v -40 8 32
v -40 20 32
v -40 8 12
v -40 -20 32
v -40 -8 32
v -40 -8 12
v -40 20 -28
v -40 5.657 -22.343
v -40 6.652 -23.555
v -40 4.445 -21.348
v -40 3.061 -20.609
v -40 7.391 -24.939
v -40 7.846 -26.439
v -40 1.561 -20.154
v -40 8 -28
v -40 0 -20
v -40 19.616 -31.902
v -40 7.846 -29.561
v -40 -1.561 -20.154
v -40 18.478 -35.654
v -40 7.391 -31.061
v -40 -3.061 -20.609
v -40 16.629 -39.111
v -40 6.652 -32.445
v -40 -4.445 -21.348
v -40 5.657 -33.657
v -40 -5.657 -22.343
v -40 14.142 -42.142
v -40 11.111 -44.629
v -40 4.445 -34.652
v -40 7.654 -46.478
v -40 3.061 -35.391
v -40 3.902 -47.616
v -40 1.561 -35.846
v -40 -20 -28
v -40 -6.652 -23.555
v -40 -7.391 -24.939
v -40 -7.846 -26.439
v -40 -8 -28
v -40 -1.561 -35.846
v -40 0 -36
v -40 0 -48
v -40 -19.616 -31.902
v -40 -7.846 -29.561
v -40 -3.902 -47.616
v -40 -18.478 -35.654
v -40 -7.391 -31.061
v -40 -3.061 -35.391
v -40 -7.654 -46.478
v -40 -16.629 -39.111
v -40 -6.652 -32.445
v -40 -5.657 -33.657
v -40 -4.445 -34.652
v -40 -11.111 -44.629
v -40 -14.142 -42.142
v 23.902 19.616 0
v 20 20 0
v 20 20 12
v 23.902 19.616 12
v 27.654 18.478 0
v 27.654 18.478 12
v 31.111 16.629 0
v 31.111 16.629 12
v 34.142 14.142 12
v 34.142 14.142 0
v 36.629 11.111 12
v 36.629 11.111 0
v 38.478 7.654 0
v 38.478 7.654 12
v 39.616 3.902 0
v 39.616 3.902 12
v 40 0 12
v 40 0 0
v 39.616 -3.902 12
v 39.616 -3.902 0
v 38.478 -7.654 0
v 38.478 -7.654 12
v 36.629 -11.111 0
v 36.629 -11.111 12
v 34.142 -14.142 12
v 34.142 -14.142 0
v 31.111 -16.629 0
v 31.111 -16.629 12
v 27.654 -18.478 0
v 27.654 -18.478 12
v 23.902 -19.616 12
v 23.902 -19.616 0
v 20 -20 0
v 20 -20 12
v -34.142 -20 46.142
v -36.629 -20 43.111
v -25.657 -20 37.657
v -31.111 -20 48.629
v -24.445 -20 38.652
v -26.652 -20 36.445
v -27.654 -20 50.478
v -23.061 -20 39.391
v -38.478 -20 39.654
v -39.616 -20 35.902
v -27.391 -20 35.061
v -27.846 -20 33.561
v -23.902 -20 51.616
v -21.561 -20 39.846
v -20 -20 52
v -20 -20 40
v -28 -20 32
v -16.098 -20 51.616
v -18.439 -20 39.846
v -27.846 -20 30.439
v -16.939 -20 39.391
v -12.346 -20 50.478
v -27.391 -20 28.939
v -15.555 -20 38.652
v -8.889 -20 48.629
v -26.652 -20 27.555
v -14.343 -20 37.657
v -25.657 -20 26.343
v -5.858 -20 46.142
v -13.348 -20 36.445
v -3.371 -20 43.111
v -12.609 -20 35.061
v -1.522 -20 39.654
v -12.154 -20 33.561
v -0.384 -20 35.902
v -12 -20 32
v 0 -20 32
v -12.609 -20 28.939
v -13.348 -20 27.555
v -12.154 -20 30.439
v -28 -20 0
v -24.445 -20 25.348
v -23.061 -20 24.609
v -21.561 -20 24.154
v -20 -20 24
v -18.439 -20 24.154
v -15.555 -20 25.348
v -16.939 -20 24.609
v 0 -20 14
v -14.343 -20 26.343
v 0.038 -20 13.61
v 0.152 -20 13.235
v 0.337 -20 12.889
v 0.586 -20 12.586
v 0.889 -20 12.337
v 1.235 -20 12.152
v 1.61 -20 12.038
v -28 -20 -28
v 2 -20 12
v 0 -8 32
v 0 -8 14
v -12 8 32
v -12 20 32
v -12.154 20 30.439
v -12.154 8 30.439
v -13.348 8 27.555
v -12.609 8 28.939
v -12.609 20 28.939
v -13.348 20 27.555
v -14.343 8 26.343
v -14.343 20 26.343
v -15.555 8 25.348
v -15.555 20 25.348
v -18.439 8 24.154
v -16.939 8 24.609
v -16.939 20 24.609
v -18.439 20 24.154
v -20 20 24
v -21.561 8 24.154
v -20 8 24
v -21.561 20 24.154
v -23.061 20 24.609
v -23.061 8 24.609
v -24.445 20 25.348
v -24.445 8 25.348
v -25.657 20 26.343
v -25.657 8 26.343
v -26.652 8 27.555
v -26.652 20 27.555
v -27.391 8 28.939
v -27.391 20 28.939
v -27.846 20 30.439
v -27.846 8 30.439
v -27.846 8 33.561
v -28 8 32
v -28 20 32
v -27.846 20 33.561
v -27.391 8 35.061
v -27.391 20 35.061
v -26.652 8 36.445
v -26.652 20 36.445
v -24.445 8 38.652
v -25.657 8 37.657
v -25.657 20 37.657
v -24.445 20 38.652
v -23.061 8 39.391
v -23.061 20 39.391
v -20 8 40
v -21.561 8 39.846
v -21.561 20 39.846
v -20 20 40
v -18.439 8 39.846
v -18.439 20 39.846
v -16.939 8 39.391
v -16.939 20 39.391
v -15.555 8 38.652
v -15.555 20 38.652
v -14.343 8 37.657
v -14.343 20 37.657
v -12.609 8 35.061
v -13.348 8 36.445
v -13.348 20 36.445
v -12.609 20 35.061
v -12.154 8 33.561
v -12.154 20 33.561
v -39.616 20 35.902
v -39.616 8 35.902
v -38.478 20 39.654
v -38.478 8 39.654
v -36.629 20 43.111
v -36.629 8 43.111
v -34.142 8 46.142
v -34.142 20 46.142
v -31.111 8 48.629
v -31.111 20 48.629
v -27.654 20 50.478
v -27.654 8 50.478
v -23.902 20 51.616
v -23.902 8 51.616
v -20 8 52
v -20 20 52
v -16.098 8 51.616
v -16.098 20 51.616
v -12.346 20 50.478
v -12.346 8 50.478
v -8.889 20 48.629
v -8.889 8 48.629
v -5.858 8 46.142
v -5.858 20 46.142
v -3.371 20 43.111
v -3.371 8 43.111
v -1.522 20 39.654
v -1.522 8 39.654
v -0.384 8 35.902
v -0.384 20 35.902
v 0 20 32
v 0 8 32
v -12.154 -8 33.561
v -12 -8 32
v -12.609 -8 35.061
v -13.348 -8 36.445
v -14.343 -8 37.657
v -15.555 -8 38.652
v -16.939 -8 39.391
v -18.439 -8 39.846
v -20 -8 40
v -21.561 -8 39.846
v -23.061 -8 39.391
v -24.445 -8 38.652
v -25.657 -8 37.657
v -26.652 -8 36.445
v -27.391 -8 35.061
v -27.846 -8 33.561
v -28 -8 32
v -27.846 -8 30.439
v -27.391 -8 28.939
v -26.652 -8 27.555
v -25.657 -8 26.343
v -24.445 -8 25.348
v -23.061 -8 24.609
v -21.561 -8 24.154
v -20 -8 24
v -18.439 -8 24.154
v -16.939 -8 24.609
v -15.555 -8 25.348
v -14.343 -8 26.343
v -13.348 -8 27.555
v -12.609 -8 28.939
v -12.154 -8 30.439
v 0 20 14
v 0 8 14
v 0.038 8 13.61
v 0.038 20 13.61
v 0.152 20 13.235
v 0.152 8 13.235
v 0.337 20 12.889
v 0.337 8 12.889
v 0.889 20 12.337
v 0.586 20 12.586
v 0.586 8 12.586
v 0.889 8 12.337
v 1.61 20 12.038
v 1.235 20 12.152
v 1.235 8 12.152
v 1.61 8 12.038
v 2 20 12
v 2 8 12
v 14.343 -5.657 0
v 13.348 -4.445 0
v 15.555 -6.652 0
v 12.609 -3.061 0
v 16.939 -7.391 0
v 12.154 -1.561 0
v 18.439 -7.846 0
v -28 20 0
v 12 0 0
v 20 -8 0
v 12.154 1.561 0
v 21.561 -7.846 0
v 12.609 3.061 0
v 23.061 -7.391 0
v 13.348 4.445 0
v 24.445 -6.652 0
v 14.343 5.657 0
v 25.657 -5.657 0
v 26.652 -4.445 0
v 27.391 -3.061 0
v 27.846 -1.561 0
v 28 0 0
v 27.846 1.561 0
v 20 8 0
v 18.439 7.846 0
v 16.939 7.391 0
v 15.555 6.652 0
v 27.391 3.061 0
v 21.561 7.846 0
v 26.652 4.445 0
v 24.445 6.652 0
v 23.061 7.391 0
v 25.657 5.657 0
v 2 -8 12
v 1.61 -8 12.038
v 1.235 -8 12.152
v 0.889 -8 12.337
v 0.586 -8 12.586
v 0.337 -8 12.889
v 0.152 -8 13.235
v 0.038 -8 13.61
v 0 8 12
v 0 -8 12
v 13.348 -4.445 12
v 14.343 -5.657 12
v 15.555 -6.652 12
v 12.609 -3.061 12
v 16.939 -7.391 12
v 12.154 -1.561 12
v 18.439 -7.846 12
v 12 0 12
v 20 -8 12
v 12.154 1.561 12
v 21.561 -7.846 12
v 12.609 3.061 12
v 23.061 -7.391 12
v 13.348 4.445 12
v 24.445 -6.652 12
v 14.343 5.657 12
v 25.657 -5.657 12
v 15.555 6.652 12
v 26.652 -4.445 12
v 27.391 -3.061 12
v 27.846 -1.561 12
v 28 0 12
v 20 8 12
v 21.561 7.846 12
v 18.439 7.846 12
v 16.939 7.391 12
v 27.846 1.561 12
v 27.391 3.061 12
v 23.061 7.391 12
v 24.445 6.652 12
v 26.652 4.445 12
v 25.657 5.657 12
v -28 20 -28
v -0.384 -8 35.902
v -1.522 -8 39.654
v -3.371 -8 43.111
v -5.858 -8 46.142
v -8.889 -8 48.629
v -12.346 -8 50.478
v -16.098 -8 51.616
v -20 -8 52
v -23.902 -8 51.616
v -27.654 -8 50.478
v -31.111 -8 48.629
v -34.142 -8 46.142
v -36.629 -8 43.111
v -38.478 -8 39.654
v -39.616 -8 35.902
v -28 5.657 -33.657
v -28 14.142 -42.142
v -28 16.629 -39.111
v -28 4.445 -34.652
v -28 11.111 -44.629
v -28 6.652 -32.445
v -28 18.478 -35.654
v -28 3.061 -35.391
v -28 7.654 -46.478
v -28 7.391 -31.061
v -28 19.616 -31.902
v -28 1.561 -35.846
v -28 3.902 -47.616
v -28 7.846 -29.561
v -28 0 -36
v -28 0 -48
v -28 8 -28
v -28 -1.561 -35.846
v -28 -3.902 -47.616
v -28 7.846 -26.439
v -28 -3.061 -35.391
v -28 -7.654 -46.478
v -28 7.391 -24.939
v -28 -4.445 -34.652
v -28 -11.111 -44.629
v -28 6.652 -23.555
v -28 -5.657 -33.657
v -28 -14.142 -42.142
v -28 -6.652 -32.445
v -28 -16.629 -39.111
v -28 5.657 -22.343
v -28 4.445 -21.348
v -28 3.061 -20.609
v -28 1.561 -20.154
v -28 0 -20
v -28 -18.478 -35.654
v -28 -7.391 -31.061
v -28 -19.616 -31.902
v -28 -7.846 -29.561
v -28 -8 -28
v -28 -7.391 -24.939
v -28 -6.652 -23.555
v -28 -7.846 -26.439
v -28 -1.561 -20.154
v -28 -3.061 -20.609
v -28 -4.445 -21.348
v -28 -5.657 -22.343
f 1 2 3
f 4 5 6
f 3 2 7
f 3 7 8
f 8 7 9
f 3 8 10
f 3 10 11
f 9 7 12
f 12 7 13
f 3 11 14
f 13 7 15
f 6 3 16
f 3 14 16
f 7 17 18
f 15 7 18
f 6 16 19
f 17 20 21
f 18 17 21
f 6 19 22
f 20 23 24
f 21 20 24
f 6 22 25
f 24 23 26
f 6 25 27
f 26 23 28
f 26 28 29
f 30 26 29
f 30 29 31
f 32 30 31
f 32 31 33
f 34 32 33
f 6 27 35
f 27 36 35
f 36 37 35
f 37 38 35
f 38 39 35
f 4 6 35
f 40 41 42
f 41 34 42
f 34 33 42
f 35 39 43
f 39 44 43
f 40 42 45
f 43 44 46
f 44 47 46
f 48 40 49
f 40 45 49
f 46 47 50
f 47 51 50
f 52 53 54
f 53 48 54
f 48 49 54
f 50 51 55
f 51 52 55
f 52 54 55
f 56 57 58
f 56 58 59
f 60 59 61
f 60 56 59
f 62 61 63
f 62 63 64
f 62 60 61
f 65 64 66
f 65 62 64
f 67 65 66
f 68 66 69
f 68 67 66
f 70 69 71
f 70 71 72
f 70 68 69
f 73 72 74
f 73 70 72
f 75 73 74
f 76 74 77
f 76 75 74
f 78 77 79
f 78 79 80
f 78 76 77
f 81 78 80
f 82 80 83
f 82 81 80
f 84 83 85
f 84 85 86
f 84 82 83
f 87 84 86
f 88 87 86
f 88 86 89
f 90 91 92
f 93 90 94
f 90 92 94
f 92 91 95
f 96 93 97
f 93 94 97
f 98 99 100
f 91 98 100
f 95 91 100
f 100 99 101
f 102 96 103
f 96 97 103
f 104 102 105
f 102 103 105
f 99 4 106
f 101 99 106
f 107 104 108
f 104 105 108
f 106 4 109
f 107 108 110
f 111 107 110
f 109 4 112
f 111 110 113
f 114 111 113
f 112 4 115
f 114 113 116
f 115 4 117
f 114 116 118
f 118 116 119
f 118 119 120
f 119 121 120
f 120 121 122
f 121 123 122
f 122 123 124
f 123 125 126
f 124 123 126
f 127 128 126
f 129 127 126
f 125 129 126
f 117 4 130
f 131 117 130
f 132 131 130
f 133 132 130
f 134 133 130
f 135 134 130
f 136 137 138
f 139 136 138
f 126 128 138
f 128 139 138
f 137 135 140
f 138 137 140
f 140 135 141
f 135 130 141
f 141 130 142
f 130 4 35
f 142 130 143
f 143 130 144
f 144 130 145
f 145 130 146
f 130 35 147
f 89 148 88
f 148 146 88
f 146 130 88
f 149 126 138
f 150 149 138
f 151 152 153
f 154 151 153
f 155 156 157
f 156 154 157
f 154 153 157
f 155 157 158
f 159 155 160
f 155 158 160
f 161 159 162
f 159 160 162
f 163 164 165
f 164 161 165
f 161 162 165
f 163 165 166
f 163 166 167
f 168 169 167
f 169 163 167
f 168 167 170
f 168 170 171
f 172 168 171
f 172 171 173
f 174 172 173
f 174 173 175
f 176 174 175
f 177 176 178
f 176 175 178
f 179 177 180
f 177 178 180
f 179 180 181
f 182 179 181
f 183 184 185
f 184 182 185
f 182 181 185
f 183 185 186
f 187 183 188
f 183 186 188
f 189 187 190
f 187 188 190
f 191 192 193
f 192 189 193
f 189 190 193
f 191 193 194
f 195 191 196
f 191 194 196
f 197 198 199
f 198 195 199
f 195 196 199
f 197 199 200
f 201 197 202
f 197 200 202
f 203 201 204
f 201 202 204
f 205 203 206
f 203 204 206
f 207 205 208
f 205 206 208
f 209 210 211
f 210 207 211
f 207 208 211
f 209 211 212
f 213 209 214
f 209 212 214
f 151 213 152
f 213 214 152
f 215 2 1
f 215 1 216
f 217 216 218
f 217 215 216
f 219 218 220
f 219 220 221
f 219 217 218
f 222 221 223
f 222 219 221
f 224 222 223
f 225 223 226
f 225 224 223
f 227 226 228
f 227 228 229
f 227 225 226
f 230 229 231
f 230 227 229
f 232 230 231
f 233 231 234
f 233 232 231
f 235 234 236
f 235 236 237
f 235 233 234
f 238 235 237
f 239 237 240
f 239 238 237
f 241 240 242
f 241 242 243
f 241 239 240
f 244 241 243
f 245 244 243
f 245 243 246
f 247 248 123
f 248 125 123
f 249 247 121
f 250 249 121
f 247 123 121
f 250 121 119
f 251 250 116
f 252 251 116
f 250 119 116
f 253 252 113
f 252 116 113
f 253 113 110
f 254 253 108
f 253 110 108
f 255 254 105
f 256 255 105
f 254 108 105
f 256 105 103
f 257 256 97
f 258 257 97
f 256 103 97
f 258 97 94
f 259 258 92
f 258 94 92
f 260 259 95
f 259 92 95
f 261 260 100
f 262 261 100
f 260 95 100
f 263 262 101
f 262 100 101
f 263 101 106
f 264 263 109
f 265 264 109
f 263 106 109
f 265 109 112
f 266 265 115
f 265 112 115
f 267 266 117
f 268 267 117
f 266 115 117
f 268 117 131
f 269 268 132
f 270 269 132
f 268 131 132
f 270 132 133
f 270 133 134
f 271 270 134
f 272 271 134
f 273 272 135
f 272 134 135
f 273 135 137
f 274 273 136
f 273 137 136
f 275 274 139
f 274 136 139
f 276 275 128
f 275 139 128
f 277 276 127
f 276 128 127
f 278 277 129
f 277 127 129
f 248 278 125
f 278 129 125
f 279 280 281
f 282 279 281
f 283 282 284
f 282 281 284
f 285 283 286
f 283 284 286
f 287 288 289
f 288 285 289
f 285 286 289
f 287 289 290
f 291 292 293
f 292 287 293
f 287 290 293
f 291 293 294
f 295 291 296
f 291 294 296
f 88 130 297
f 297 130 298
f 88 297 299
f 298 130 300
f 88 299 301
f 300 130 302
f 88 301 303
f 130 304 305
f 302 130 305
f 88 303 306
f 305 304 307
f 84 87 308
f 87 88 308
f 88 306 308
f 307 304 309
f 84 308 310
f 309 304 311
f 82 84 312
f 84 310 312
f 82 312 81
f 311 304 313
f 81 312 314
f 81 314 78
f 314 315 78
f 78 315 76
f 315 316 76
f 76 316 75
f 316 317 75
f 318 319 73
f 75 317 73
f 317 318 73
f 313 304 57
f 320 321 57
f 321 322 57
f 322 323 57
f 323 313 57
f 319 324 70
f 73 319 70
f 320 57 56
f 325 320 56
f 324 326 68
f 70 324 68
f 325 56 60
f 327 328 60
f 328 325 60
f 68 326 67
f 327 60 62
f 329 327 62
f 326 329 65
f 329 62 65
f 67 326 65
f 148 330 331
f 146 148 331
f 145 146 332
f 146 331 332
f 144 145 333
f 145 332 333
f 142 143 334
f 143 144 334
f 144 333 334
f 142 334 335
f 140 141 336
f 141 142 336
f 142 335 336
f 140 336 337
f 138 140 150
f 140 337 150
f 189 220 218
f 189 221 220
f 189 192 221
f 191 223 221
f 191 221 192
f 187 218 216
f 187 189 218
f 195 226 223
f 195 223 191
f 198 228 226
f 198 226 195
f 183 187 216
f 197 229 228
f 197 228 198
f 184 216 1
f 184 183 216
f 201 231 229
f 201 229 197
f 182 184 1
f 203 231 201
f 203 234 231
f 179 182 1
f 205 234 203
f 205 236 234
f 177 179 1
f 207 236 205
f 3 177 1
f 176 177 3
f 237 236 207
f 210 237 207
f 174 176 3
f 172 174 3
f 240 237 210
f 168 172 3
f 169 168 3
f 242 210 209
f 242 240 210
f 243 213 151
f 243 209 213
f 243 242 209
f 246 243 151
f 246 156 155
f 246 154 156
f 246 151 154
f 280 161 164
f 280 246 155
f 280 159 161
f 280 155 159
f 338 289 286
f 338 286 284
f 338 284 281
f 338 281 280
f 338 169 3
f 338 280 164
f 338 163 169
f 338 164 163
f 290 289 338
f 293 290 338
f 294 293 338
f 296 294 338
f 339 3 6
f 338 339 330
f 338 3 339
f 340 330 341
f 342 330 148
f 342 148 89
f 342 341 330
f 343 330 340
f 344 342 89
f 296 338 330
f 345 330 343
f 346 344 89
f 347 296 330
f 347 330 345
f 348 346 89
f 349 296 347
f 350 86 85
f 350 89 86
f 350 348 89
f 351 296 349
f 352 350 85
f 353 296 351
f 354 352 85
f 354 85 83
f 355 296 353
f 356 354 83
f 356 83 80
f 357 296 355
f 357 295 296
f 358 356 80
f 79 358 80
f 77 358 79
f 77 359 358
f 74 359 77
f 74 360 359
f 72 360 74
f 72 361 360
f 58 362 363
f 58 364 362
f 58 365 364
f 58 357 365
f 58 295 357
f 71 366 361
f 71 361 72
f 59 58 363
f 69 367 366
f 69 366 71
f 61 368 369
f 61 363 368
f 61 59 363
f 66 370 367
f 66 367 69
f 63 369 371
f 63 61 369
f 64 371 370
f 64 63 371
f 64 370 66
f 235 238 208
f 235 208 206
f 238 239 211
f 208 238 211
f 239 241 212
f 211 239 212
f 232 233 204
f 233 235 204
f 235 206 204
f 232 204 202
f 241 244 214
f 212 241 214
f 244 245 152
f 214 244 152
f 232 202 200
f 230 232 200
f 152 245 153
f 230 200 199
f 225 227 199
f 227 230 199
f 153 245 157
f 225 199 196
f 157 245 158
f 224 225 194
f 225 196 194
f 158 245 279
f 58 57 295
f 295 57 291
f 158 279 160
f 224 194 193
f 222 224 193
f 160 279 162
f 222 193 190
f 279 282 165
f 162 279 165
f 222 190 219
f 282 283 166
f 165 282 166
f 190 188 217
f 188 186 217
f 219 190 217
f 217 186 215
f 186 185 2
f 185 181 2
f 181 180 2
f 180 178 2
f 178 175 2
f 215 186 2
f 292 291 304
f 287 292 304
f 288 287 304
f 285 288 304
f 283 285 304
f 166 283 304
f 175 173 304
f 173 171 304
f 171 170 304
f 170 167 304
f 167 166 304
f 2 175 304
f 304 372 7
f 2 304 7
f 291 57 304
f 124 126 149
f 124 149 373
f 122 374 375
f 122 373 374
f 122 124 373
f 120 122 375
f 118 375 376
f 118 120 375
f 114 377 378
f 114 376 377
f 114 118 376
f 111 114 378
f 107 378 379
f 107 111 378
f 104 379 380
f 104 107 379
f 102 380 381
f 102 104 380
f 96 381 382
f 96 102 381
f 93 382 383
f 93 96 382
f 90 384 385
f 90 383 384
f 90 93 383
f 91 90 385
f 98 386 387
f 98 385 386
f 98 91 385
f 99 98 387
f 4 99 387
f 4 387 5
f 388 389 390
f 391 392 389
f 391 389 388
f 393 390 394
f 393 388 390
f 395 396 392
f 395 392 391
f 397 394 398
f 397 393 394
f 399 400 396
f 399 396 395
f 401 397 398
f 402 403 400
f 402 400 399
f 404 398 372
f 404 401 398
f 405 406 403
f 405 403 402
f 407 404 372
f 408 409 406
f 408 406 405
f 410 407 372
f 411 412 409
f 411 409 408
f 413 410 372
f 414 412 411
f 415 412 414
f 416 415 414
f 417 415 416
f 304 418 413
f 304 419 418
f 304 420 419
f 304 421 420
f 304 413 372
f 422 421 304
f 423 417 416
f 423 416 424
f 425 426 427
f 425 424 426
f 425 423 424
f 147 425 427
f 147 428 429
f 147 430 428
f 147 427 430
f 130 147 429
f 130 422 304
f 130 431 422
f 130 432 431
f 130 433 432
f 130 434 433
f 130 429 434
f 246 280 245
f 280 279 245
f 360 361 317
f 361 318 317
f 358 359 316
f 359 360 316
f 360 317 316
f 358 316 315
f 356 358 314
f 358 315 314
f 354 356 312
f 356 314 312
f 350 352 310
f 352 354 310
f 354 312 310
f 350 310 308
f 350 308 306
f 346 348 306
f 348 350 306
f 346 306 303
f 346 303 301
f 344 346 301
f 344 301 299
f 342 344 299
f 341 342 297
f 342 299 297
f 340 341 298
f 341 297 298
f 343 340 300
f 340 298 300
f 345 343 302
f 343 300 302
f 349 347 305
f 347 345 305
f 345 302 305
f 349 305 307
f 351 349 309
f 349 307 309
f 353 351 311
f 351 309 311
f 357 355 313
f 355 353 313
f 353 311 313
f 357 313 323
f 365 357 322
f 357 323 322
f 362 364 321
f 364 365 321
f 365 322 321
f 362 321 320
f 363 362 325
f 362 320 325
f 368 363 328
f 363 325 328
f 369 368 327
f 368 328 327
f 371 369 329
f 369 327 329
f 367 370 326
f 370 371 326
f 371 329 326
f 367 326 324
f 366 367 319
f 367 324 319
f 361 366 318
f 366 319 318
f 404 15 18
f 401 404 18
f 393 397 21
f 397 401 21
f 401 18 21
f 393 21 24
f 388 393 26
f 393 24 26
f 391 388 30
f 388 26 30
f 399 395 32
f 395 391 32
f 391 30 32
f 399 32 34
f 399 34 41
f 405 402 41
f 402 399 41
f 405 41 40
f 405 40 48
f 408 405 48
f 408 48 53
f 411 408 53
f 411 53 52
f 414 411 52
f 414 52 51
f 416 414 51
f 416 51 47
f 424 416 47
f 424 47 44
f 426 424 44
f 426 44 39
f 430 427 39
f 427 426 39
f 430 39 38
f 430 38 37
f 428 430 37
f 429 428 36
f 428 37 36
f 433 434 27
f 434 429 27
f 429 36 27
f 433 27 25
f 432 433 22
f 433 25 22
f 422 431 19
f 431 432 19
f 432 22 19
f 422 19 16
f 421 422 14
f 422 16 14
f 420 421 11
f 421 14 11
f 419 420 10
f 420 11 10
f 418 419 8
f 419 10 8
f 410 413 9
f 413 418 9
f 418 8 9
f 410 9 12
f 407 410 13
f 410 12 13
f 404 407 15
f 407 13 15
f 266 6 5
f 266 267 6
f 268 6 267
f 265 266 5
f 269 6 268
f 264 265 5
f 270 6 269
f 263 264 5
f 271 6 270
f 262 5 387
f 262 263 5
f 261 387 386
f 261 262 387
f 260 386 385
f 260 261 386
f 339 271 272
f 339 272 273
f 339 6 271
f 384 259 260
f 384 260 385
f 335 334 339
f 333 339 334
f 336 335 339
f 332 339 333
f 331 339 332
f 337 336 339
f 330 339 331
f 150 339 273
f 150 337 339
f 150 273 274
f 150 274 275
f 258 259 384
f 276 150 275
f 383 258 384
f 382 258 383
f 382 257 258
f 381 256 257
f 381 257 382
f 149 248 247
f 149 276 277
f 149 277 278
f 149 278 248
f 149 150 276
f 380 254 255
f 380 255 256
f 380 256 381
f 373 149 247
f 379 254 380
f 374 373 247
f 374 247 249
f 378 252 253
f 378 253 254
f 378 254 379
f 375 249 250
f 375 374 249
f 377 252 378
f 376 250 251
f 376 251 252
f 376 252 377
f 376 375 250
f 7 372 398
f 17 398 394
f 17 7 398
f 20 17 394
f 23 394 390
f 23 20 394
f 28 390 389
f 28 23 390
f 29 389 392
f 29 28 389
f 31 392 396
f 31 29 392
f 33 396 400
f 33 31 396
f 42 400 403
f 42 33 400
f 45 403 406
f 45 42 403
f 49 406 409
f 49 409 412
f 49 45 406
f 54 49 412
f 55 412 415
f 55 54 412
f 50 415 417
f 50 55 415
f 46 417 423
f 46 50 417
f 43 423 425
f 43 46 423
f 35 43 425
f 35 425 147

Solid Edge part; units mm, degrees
sketch "Sketch1" plane through (0, 0, 0) normal (0, 0, 1) x (1, 0, 0)
  line L0 (-40, -20) -> (20, -20)
  line L1 (-40, 20) -> (-40, -20)
  line L2 (8, 20) -> (-40, 20)
  line L3 (20, 20) -> (8, 20)
  arc A0 (20, 20) -> (20, -20) centre (20, 0) cw
  circle A1 centre (20, 0) radius 8
extrude "ExtrudedProtrusion_1" add sketch "Sketch1" along normal blind 12
sketch "Sketch2" plane through (0, -20, 0) normal (0, -1, 0) x (1, 0, 0)
  line L0 (0, 32) -> (0, 12)
  line L1 (0, 12) -> (-40, 12)
  line L2 (-40, 12) -> (-40, 32)
  arc A0 (-40, 32) -> (0, 32) centre (-20, 32) cw
  circle A1 centre (-20, 32) radius 8
extrude "ExtrudedProtrusion_2" add sketch "Sketch2" against normal blind 12
mirror "Mirror1" about plane through (0, 0, 0) normal (0, -1, 0) of "ExtrudedProtrusion_2"
sketch "Sketch3" plane through (-40, 0, 0) normal (1, 0, 0) x (0, 1, 0)
  line L0 (-20, 0) -> (-20, -28)
  line L1 (20, -28) -> (20, 0)
  line L2 (20, 0) -> (-20, 0)
  arc A0 (20, -28) -> (-20, -28) centre (0, -28) cw
  circle A1 centre (0, -28) radius 8
extrude "ExtrudedProtrusion_4" add sketch "Sketch3" along normal blind 12
fillet "Round_2" radius 2 1 edges at (0, -14, 12)
fillet "Round_3" radius 2 1 edges at (0, 14, 12)
